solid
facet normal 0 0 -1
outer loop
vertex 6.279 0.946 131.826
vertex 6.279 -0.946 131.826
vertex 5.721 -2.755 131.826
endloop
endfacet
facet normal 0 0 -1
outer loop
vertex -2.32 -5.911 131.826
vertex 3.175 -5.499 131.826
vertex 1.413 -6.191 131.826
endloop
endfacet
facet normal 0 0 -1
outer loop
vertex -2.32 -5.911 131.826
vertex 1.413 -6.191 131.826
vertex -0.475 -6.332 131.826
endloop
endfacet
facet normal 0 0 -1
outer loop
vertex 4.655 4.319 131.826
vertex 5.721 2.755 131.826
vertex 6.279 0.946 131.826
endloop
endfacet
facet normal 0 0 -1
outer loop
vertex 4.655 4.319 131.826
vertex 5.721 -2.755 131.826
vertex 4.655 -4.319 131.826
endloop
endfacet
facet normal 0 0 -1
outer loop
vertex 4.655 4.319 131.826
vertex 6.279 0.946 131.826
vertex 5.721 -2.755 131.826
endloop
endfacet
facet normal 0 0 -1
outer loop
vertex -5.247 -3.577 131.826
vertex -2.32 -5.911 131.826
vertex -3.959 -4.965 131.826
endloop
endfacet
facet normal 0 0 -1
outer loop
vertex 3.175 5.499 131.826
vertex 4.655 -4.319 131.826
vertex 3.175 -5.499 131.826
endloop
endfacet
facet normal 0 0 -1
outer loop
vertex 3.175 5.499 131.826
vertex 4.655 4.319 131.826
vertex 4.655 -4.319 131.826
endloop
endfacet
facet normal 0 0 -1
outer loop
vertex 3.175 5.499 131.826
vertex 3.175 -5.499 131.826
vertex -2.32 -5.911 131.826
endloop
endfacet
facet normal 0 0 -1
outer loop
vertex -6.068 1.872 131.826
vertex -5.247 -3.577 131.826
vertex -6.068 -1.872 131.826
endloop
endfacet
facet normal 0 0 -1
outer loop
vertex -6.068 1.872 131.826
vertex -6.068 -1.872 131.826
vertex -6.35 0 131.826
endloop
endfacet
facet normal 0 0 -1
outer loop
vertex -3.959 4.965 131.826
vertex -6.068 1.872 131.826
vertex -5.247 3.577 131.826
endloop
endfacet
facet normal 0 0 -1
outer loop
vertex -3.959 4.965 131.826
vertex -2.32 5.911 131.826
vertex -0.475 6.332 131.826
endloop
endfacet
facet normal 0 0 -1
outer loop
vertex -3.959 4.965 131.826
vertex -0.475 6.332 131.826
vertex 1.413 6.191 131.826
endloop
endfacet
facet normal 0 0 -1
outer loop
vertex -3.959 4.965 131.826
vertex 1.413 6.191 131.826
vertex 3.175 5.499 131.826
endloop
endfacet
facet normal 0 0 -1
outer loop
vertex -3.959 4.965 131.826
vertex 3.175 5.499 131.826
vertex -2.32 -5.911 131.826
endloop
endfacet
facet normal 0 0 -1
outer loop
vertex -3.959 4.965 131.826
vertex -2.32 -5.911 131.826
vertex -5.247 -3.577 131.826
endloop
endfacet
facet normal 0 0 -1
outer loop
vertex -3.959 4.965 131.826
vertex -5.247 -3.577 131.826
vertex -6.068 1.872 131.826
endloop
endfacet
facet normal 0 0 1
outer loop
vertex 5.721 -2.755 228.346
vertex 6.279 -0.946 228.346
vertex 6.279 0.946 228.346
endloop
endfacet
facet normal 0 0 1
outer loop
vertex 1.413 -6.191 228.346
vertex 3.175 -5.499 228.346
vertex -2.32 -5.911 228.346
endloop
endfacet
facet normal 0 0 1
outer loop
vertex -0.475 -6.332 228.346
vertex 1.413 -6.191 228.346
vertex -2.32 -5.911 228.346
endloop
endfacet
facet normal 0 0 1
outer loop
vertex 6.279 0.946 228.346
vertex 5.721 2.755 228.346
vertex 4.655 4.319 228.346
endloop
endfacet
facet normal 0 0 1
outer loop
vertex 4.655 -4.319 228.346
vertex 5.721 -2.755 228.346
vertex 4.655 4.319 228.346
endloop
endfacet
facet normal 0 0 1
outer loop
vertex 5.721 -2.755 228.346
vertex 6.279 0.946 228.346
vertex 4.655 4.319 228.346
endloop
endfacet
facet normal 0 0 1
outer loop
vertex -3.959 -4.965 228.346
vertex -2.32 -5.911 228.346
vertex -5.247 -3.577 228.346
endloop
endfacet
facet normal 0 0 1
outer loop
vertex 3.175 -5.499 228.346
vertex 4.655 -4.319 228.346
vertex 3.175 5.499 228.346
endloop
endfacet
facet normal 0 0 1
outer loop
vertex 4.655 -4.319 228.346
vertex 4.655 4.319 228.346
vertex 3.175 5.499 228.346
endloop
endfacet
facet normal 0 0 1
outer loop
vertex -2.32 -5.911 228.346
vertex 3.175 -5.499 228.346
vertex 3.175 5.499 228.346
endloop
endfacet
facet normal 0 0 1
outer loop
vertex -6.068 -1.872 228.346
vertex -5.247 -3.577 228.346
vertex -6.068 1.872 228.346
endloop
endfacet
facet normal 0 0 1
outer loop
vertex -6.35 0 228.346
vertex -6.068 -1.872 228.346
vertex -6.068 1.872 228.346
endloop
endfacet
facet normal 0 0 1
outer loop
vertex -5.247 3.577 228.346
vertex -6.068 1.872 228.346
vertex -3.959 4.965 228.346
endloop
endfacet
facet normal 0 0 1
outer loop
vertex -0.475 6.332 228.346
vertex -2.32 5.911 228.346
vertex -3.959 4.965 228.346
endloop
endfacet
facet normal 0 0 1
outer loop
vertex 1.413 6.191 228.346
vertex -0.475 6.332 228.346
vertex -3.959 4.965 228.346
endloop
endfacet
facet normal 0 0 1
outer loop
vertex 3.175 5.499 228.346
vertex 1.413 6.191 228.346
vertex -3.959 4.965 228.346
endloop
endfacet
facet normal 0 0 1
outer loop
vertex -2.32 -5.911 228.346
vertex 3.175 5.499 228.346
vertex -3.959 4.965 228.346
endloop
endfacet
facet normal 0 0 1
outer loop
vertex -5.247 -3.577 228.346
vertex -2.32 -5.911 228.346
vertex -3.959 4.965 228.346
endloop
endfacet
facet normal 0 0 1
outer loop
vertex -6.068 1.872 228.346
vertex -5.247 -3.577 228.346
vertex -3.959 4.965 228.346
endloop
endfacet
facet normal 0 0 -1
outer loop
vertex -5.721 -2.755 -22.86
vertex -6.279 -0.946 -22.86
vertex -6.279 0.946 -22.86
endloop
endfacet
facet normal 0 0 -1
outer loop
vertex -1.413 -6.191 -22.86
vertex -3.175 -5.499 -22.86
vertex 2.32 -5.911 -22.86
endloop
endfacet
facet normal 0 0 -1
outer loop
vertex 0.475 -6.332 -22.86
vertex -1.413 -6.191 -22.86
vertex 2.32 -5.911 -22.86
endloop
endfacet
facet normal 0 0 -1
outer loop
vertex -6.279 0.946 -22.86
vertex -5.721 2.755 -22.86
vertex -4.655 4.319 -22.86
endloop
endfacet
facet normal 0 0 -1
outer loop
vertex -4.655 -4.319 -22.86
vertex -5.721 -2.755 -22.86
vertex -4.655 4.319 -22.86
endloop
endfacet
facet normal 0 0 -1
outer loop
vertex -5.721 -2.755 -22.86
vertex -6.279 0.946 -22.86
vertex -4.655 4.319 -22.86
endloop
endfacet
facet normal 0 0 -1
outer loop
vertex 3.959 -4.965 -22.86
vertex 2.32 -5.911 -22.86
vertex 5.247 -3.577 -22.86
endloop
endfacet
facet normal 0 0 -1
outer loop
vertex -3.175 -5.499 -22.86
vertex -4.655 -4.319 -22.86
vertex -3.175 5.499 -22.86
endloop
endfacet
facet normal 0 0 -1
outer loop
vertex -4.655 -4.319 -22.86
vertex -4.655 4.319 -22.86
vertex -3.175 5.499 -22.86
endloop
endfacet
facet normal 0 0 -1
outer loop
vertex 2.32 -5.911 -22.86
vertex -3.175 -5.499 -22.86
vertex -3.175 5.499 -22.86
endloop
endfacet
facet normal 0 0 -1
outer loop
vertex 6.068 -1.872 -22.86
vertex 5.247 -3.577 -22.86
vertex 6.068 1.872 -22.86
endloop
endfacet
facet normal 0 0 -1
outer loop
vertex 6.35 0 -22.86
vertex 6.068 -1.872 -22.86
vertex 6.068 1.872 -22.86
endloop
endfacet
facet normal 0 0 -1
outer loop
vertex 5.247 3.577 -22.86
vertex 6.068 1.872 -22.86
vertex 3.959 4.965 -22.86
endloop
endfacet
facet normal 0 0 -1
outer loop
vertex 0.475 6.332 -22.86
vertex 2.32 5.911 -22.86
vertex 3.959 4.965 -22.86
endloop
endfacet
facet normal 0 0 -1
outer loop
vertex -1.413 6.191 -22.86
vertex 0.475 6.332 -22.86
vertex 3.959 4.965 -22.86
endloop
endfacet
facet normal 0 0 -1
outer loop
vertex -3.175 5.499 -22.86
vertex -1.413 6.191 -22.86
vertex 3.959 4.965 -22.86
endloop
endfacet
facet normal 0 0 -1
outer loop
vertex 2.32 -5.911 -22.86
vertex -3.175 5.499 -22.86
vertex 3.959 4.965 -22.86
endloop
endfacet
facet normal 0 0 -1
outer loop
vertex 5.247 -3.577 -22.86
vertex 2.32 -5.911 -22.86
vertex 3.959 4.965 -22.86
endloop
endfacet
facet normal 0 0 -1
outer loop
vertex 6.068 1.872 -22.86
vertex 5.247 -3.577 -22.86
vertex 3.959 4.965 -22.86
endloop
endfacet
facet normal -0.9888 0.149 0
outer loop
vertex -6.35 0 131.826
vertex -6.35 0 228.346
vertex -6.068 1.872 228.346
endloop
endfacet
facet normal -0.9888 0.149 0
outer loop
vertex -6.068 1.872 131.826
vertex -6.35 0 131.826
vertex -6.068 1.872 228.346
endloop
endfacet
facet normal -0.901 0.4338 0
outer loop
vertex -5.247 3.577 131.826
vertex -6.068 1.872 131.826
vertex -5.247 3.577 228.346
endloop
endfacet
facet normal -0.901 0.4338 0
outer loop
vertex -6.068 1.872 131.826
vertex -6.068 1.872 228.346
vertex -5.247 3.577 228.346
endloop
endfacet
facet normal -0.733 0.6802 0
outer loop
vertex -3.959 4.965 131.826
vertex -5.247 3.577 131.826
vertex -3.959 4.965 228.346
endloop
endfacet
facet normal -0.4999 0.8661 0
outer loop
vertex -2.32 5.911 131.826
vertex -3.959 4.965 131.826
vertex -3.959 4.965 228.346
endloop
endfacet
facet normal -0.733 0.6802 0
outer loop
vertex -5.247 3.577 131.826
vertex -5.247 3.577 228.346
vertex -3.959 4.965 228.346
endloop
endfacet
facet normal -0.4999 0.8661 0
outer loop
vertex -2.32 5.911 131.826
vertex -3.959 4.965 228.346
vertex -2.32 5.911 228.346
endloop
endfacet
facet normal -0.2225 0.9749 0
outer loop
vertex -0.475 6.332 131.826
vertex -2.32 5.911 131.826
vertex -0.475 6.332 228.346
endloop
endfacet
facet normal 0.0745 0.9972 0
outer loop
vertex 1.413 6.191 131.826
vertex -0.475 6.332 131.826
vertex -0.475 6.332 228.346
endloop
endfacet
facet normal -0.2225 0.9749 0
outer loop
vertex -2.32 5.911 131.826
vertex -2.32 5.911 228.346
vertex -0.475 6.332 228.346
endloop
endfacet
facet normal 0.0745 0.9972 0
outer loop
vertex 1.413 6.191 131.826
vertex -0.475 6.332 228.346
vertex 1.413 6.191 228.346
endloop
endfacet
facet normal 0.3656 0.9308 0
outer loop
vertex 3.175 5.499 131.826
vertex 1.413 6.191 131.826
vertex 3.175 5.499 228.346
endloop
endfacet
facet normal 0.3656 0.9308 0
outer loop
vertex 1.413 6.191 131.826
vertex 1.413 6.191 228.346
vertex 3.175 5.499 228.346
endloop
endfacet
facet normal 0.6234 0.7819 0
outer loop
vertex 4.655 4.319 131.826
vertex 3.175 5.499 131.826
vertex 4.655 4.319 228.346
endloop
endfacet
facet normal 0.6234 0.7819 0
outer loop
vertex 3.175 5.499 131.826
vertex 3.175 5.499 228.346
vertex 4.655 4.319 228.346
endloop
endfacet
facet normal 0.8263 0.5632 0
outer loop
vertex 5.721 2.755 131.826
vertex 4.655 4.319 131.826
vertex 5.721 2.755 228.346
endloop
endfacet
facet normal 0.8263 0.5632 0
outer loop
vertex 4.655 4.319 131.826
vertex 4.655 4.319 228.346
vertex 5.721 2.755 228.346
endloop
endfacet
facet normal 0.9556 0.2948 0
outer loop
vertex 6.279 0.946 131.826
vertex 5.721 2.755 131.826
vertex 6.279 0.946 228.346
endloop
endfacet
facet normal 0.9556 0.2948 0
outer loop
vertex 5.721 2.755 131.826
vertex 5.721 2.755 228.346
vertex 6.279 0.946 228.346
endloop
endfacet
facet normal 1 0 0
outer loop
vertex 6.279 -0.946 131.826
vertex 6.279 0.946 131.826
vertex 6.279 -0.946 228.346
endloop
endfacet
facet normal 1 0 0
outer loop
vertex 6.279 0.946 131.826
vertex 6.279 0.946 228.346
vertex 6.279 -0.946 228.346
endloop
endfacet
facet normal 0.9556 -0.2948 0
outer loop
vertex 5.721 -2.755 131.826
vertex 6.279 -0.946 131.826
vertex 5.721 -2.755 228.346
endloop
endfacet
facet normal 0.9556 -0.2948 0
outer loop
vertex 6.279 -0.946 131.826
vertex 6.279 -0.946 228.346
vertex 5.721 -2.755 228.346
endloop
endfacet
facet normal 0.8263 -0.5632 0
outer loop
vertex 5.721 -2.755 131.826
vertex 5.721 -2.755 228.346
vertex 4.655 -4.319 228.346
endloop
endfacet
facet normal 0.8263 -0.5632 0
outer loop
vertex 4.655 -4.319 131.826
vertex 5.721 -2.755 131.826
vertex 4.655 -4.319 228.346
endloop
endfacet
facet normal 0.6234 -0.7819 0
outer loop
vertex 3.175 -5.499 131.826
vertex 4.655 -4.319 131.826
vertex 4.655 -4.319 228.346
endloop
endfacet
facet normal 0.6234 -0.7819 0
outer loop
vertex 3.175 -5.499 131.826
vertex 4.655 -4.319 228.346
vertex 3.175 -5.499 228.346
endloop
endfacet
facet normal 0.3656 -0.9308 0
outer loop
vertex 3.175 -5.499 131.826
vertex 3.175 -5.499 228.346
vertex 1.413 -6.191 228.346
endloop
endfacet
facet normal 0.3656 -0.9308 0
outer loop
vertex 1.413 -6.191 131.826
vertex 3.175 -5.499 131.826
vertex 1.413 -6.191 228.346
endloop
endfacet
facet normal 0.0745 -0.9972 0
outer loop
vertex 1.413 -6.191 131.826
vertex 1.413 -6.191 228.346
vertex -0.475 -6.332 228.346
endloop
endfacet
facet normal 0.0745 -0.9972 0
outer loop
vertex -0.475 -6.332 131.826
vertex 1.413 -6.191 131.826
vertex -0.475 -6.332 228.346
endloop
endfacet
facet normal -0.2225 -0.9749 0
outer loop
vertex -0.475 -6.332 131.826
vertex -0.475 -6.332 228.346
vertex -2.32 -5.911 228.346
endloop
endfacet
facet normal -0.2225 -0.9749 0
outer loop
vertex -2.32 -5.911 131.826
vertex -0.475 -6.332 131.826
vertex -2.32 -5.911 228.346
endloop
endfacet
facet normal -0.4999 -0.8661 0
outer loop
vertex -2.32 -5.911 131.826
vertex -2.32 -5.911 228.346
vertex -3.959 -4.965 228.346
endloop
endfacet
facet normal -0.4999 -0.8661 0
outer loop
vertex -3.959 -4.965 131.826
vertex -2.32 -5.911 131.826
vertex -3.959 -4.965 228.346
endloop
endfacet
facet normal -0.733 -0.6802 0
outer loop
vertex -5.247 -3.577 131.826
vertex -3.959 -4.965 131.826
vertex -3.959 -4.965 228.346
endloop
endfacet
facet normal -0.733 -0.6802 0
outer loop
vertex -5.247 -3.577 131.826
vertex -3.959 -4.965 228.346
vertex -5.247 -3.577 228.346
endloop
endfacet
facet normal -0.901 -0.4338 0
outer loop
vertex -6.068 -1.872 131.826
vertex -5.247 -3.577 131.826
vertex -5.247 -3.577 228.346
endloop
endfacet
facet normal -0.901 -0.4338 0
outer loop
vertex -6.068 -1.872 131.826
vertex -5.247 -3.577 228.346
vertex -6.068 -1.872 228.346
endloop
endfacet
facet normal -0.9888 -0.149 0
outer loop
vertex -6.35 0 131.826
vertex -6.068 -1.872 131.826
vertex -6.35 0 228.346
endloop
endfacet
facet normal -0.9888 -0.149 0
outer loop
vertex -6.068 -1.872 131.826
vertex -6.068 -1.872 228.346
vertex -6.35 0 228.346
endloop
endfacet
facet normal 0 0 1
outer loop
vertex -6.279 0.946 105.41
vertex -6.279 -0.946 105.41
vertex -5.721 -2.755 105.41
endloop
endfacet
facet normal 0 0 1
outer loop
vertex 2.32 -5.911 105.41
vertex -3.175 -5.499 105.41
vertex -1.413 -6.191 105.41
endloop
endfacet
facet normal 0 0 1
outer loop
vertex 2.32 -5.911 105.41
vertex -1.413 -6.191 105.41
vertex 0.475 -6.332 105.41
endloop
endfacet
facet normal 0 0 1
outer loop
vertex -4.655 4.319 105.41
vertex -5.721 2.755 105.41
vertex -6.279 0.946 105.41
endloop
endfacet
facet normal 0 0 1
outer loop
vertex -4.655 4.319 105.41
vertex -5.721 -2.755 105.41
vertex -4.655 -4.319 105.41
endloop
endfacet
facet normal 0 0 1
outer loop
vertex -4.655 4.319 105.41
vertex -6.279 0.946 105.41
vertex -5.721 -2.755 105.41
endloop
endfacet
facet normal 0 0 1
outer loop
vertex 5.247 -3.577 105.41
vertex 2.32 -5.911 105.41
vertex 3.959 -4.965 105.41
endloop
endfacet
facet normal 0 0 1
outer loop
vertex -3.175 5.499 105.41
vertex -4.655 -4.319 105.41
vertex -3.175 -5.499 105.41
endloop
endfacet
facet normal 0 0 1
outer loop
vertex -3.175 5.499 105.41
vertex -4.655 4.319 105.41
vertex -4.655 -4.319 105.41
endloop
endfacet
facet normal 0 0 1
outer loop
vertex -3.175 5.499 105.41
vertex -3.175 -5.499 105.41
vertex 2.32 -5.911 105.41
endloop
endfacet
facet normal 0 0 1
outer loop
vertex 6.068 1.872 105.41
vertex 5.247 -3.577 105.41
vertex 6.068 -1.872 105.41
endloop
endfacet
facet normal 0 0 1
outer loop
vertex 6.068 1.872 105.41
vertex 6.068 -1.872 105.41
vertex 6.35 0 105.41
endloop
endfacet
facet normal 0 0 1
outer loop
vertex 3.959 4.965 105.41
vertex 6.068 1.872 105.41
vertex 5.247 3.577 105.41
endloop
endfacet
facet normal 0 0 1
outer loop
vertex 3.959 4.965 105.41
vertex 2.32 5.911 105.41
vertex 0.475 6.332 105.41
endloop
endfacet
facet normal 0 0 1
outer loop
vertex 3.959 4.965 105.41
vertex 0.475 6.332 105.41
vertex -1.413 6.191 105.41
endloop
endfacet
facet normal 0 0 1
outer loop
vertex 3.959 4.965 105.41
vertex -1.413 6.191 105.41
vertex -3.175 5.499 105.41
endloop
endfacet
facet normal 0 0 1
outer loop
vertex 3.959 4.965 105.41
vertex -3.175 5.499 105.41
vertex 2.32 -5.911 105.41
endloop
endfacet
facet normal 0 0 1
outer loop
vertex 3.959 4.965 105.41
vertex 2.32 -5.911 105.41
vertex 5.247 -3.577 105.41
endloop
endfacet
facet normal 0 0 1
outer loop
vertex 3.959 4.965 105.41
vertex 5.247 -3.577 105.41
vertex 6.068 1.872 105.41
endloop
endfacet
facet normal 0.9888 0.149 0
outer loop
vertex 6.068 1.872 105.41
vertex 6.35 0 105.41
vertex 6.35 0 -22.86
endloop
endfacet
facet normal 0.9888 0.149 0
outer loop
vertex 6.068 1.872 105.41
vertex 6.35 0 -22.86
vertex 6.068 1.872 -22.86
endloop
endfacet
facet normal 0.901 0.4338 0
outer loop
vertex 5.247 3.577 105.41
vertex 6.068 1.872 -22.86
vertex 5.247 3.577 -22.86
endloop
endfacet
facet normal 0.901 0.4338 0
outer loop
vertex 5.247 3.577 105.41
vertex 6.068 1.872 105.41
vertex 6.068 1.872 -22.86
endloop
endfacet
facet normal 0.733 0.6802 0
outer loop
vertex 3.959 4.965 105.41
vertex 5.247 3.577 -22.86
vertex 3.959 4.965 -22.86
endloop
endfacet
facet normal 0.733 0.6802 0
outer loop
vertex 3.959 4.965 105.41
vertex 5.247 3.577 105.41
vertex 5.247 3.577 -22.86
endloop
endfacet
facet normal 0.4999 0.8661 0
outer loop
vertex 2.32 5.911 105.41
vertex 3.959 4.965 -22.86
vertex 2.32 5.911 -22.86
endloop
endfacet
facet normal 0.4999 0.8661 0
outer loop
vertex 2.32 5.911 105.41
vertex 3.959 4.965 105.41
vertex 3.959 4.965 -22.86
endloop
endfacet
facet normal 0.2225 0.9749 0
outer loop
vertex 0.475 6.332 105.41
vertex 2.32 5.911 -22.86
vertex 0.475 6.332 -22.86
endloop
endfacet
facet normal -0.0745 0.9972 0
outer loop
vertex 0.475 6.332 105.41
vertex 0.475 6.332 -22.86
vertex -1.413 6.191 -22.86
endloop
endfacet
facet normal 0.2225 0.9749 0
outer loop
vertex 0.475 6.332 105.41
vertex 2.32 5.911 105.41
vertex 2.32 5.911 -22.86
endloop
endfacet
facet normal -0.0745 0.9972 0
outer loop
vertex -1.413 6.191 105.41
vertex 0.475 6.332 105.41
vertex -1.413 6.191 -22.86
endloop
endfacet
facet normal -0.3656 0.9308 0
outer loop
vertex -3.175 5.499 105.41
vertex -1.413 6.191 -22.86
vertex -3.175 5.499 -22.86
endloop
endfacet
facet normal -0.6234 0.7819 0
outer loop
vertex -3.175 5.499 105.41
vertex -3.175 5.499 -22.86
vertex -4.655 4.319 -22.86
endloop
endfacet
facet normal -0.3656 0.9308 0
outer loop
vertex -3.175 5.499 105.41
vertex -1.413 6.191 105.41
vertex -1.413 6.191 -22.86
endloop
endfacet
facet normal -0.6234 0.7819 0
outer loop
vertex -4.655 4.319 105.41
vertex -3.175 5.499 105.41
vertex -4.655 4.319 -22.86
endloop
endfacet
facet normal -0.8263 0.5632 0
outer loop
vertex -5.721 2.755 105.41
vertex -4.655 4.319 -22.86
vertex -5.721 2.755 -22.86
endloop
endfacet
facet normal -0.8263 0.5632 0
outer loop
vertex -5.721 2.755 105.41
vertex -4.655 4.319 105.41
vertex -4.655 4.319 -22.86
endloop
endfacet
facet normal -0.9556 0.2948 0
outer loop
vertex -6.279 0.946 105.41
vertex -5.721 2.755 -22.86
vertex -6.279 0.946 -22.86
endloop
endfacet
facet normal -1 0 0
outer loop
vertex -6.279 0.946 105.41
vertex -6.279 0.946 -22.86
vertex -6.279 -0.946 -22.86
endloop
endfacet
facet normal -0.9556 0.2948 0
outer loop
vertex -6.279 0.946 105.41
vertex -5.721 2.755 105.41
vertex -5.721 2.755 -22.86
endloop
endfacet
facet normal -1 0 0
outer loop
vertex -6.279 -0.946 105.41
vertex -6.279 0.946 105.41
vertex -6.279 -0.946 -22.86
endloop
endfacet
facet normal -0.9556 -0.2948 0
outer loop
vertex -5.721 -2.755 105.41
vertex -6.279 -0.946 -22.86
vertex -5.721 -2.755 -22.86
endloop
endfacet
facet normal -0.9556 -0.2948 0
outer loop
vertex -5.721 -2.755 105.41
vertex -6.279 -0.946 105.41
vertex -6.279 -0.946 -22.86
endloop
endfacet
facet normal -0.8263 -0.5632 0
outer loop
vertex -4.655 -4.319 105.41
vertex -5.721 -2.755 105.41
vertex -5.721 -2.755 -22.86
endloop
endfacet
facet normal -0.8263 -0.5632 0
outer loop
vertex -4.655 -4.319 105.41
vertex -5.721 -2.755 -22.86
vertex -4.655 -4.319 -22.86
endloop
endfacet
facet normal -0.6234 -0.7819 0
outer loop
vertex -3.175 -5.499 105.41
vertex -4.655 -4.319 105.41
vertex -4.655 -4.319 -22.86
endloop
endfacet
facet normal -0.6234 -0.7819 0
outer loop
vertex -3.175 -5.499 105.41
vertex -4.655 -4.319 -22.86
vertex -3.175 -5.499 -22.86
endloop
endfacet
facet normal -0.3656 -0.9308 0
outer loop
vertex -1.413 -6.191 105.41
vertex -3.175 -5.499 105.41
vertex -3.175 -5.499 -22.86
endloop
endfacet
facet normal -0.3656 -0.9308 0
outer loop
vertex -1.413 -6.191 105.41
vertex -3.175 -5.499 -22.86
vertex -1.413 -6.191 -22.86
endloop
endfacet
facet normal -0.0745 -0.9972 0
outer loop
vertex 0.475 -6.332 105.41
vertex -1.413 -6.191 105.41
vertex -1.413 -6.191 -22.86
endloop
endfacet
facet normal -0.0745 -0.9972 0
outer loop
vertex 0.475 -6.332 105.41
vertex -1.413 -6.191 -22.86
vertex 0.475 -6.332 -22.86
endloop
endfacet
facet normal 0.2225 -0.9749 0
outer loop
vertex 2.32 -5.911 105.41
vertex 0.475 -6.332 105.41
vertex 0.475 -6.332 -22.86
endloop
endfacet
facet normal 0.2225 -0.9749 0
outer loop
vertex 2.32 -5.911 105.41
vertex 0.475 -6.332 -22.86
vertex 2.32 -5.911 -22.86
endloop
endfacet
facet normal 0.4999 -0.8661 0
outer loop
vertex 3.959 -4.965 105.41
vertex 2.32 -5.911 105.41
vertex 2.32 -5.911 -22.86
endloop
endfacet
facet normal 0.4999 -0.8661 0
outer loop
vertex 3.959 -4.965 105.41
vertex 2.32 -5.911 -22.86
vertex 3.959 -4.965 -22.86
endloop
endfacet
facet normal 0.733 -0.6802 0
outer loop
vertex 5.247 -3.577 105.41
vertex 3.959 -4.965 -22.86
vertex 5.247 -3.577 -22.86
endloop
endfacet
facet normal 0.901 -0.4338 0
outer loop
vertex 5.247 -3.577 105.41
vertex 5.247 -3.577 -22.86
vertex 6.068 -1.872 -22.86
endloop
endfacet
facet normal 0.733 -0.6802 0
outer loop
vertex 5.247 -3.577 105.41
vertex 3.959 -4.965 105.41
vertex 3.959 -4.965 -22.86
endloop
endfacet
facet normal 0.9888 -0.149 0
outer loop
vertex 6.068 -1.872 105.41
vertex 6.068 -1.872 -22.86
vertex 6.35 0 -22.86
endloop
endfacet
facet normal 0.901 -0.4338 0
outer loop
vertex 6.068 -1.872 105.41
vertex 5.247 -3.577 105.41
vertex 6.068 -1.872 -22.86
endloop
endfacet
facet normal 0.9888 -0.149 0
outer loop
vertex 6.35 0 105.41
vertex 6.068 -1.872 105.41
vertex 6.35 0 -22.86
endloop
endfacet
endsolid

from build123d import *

# Parameters (mm, degrees)
BOSS_EXTRUDE1_OUTLINE_R = 6.35
BOSS_EXTRUDE1_DEPTH     = 96.52
SKETCH3_R               = 6.35
BOSS_EXTRUDE2_DEPTH     = 128.27


# Read off the part's stored shape, not the designer's step: Boss-Extrude1
with BuildPart() as part:
    # Boss-Extrude1 outline → Boss-Extrude1 (new body)
    with BuildSketch(Plane(origin=(0, 0, 228.346), x_dir=(-1, 0, 0), z_dir=(0, 0, -1))):
        Circle(BOSS_EXTRUDE1_OUTLINE_R)
    extrude(amount=BOSS_EXTRUDE1_DEPTH)


with BuildPart() as body_2:
    # Sketch3 → Boss-Extrude2 (new body)
    with BuildSketch(Plane.XY.offset(105.41)):
        Circle(SKETCH3_R)
    extrude(amount=-BOSS_EXTRUDE2_DEPTH)


solid = Compound([part.part, body_2.part])
